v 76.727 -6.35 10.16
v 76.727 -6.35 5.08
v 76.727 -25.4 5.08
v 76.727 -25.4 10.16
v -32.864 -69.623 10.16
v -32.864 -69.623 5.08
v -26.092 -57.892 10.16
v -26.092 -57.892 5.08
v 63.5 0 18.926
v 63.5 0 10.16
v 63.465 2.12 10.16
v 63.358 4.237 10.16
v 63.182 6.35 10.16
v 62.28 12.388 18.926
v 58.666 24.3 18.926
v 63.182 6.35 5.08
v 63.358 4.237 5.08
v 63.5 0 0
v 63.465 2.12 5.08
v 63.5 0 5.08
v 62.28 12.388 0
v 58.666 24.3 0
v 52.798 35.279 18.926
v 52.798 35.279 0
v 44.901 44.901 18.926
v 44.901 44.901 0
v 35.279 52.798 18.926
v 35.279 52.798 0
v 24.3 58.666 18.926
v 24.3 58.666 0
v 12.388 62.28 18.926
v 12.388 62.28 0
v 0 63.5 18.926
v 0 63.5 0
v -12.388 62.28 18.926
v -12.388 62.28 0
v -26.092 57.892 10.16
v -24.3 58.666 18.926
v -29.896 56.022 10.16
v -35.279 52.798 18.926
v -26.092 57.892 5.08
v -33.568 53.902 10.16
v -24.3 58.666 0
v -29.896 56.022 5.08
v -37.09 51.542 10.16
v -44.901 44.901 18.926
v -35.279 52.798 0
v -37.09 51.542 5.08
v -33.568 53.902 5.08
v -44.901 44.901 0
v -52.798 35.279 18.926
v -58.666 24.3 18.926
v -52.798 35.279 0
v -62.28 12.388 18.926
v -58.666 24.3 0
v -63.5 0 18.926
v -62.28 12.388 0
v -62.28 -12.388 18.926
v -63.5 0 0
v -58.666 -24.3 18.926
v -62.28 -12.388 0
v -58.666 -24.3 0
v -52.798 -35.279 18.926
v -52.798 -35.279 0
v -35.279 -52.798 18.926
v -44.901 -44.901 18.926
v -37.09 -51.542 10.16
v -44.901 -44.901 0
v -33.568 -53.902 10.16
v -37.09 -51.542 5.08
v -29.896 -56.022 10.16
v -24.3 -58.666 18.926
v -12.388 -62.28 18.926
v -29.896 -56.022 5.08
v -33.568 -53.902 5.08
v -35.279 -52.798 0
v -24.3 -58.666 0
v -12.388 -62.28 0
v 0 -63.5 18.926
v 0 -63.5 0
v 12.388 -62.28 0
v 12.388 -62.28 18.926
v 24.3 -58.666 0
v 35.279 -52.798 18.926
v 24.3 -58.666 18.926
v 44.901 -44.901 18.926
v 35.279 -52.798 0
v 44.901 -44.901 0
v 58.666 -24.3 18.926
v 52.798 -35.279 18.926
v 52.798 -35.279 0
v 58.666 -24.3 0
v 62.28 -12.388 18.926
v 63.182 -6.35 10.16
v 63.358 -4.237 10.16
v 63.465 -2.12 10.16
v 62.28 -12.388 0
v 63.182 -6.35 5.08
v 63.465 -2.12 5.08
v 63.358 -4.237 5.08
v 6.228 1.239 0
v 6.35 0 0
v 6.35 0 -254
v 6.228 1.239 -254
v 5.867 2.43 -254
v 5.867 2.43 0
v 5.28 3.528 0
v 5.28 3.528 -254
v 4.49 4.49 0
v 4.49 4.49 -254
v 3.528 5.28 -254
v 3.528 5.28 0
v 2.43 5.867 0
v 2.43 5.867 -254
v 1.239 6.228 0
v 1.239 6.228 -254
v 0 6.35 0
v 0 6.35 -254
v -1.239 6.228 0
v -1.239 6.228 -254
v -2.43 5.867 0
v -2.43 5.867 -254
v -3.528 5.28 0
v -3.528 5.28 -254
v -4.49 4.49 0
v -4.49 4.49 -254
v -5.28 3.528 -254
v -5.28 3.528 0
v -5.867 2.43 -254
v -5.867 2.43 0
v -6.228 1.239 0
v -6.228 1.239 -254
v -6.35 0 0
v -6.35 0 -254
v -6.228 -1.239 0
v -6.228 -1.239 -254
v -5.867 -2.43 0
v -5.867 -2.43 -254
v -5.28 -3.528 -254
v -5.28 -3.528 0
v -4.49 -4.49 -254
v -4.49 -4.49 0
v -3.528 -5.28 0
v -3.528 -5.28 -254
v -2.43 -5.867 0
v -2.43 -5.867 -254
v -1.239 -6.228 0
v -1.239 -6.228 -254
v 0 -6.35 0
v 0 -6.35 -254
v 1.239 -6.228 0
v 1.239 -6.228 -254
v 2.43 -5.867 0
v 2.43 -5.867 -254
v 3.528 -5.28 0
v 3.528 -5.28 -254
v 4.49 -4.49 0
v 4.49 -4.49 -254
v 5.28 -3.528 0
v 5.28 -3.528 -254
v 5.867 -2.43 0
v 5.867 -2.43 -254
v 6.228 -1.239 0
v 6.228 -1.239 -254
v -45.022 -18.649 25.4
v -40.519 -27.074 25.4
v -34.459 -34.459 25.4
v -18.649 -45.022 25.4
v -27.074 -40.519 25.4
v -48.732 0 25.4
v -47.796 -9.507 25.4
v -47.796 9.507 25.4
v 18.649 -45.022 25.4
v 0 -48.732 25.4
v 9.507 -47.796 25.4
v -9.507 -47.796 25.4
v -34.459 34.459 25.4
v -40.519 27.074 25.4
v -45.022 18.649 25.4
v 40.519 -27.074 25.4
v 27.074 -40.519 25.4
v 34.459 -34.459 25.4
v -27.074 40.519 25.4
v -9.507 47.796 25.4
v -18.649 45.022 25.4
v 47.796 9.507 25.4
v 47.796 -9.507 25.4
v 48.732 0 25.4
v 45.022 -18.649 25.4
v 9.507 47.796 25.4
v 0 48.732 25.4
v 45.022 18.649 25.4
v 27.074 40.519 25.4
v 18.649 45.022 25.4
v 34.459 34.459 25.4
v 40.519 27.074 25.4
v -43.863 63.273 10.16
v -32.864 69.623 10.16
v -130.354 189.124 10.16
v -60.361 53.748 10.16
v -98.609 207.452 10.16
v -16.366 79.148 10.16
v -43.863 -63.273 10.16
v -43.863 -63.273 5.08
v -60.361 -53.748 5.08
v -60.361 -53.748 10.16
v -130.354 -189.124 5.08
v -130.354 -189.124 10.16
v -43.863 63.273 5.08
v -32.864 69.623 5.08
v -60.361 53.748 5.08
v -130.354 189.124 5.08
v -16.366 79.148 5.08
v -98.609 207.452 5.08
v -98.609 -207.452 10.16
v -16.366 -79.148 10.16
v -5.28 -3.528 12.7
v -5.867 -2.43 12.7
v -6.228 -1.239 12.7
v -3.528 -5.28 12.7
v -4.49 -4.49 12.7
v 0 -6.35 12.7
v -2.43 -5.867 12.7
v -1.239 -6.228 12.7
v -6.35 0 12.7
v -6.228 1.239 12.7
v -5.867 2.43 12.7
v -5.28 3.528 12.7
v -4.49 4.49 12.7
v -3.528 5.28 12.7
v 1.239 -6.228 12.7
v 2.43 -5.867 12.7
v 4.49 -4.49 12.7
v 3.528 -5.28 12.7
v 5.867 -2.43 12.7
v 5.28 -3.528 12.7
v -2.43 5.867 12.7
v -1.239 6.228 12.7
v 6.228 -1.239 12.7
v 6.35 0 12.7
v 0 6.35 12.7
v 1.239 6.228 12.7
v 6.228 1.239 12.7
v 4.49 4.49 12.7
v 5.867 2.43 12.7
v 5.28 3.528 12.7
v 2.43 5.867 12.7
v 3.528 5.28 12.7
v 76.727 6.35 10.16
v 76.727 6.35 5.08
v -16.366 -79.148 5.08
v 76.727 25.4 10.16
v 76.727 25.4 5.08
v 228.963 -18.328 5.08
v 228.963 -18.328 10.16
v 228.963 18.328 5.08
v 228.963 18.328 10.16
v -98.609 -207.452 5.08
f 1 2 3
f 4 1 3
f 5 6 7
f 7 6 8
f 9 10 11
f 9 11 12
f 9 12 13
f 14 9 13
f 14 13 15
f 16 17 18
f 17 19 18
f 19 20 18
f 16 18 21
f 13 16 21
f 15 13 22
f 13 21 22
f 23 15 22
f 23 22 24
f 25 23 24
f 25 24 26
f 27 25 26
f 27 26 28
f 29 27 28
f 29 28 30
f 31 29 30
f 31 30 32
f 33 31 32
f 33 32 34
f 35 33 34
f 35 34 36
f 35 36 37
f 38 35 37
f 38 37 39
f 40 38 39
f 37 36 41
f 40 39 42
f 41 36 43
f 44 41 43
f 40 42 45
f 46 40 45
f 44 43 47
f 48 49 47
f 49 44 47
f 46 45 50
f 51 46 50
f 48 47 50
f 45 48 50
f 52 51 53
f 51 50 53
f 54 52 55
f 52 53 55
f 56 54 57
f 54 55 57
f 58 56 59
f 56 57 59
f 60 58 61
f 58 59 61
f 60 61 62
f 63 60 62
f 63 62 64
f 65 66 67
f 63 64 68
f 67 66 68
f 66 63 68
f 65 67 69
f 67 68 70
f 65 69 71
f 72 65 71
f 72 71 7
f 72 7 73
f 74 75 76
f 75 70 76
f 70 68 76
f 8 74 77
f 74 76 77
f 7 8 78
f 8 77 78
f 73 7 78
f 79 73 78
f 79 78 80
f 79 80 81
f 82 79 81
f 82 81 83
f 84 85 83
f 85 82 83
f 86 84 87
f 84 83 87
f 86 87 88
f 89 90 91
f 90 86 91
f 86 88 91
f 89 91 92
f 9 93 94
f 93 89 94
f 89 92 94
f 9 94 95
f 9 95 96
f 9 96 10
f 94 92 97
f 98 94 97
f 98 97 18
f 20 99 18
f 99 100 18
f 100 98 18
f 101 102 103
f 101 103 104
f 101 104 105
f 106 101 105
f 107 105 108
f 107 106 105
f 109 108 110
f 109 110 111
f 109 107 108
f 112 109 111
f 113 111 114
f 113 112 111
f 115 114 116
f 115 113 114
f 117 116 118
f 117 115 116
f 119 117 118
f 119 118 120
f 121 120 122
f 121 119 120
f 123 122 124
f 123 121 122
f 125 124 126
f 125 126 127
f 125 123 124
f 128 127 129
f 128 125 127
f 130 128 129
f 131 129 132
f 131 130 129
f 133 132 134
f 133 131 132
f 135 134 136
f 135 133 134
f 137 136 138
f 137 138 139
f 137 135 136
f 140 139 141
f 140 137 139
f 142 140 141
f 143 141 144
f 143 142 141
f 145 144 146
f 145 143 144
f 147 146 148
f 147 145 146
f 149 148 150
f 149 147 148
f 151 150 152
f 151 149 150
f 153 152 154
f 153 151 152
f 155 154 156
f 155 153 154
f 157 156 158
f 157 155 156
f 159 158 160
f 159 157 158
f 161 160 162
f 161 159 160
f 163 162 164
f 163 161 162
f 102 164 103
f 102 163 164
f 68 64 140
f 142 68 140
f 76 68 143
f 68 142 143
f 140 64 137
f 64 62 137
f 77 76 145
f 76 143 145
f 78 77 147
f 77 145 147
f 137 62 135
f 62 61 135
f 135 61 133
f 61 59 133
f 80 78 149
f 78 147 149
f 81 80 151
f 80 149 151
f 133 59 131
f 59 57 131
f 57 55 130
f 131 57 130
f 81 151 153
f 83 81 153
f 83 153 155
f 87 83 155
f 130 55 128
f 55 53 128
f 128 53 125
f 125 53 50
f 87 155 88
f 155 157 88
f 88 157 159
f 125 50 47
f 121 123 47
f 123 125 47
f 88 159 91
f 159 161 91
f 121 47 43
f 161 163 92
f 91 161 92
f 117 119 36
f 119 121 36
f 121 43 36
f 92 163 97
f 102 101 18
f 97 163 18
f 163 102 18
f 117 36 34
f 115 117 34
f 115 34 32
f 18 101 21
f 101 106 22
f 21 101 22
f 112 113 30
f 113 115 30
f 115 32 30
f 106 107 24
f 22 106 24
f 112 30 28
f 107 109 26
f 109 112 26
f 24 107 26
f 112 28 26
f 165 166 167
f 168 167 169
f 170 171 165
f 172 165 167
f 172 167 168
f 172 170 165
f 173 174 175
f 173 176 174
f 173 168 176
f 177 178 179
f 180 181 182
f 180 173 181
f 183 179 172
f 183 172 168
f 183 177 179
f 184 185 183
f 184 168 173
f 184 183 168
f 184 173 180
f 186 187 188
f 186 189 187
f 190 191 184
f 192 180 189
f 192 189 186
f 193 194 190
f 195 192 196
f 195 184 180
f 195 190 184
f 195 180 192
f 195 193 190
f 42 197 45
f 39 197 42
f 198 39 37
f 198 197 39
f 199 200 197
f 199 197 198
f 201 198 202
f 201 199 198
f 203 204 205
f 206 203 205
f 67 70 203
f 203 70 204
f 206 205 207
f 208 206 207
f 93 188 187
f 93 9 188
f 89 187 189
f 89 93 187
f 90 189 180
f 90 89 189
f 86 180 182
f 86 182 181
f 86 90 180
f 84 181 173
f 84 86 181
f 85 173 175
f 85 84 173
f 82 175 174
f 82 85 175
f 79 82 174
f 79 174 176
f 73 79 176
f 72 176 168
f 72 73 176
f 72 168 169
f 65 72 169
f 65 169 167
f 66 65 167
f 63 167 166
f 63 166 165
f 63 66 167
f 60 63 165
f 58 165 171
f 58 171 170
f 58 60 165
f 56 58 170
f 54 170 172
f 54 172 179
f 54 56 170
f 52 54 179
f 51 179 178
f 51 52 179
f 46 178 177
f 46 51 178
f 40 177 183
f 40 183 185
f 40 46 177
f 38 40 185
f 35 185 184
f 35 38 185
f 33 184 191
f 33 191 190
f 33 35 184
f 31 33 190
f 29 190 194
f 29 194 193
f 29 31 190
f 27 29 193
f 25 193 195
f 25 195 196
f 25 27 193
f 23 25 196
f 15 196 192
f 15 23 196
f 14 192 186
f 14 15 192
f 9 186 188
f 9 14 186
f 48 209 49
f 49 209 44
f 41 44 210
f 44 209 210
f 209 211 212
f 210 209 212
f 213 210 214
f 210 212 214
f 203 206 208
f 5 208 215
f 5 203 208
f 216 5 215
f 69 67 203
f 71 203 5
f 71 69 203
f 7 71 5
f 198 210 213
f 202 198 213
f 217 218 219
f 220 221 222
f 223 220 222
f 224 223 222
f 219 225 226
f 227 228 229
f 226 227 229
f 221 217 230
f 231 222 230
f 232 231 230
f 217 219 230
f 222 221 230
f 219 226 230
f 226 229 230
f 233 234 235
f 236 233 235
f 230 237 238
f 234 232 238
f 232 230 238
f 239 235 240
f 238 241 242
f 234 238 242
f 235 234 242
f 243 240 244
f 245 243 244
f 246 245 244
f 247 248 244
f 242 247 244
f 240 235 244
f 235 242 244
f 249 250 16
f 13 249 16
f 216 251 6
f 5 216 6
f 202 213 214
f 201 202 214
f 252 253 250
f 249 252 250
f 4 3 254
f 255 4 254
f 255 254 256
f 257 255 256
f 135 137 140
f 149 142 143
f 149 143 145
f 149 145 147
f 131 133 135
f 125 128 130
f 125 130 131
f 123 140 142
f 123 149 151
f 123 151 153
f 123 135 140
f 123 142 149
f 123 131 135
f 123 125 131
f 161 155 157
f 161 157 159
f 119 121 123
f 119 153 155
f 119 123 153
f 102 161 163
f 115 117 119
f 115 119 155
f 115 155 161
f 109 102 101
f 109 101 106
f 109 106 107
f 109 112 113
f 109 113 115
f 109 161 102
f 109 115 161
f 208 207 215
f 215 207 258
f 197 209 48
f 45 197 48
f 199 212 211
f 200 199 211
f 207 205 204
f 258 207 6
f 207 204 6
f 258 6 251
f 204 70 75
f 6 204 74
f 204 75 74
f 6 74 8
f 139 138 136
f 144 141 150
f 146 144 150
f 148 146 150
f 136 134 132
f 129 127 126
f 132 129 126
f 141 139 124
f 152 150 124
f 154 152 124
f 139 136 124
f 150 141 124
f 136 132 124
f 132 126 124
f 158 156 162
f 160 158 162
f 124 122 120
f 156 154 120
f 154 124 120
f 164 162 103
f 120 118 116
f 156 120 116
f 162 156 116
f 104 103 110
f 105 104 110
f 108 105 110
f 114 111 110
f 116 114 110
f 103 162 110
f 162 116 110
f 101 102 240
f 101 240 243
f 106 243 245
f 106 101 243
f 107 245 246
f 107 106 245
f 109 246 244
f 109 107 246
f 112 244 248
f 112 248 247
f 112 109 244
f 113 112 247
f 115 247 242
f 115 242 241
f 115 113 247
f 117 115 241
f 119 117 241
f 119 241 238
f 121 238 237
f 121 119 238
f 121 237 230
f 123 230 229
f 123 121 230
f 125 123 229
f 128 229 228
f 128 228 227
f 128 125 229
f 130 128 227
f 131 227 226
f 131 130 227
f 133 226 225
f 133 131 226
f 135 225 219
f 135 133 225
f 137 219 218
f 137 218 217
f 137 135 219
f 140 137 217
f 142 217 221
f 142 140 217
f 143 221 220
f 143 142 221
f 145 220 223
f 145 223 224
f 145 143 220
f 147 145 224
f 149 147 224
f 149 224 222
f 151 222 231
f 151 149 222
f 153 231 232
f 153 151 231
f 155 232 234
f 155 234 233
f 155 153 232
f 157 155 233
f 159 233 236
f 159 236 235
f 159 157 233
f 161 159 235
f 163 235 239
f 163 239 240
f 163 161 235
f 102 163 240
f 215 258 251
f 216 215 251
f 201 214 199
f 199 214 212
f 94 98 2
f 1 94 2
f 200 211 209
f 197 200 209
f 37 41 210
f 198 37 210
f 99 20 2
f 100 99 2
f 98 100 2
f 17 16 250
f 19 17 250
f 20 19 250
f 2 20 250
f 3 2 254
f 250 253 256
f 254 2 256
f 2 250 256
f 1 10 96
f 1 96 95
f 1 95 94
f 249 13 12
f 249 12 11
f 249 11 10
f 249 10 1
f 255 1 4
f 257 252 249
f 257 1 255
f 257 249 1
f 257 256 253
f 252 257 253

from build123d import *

# Parameters (mm, degrees)
F0_R     = 63.5
F1_DEPTH = 25.4
F6_DEPTH = 5.08
F7_R     = 6.35
F8_DEPTH = 254
F9_DEPTH = 12.7


with BuildPart() as f1:
    # F0 (on Top) → F1 (new body)
    with BuildSketch(Plane.XY):
        Circle(F0_R)
    extrude(amount=F1_DEPTH)

    # F2 (on Front) → F3 (revolve, cut)
    with BuildSketch(Plane.XZ):
        Polygon((69.119722, 45.064148), (37.484989, 30.330164), (69.119722, 16.462883), align=None)
    revolve(axis=Axis((0, 0, 8.879215), (0, 0, -1)), mode=Mode.SUBTRACT)

    # F5 (on offset) → F6 (join)
    with BuildSketch(Plane.XY.offset(5.08)):
        Polygon((76.726988, 6.35), (61.486988, 6.35), (61.486988, -6.35), (76.726988, -6.35), (76.726988, -25.4), (228.96282, -18.328116), (228.96282, 18.328116), (76.726988, 25.4), align=None)
        Polygon((-43.862755, 63.272521), (-36.242755, 50.074294), (-25.244233, 56.424294), (-32.864233, 69.622521), (-16.366449, 79.147521), (-98.608796, 207.451677), (-130.354024, 189.123561), (-60.360539, 53.747521), align=None)
        Polygon((-32.864233, -69.622521), (-25.244233, -56.424294), (-36.242755, -50.074294), (-43.862755, -63.272521), (-60.360539, -53.747521), (-130.354024, -189.123561), (-98.608796, -207.451677), (-16.366449, -79.147521), align=None)
    extrude(amount=F6_DEPTH)

    # F7 (on Top) → F9 (cut)
    with BuildSketch(Plane.XY):
        Circle(F7_R)
    extrude(amount=F9_DEPTH, mode=Mode.SUBTRACT)


with BuildPart() as f8:
    # F7 (on Top) → F8 (new body)
    with BuildSketch(Plane.XY):
        Circle(F7_R)
    extrude(amount=-F8_DEPTH)


solid = Compound([f1.part, f8.part])
